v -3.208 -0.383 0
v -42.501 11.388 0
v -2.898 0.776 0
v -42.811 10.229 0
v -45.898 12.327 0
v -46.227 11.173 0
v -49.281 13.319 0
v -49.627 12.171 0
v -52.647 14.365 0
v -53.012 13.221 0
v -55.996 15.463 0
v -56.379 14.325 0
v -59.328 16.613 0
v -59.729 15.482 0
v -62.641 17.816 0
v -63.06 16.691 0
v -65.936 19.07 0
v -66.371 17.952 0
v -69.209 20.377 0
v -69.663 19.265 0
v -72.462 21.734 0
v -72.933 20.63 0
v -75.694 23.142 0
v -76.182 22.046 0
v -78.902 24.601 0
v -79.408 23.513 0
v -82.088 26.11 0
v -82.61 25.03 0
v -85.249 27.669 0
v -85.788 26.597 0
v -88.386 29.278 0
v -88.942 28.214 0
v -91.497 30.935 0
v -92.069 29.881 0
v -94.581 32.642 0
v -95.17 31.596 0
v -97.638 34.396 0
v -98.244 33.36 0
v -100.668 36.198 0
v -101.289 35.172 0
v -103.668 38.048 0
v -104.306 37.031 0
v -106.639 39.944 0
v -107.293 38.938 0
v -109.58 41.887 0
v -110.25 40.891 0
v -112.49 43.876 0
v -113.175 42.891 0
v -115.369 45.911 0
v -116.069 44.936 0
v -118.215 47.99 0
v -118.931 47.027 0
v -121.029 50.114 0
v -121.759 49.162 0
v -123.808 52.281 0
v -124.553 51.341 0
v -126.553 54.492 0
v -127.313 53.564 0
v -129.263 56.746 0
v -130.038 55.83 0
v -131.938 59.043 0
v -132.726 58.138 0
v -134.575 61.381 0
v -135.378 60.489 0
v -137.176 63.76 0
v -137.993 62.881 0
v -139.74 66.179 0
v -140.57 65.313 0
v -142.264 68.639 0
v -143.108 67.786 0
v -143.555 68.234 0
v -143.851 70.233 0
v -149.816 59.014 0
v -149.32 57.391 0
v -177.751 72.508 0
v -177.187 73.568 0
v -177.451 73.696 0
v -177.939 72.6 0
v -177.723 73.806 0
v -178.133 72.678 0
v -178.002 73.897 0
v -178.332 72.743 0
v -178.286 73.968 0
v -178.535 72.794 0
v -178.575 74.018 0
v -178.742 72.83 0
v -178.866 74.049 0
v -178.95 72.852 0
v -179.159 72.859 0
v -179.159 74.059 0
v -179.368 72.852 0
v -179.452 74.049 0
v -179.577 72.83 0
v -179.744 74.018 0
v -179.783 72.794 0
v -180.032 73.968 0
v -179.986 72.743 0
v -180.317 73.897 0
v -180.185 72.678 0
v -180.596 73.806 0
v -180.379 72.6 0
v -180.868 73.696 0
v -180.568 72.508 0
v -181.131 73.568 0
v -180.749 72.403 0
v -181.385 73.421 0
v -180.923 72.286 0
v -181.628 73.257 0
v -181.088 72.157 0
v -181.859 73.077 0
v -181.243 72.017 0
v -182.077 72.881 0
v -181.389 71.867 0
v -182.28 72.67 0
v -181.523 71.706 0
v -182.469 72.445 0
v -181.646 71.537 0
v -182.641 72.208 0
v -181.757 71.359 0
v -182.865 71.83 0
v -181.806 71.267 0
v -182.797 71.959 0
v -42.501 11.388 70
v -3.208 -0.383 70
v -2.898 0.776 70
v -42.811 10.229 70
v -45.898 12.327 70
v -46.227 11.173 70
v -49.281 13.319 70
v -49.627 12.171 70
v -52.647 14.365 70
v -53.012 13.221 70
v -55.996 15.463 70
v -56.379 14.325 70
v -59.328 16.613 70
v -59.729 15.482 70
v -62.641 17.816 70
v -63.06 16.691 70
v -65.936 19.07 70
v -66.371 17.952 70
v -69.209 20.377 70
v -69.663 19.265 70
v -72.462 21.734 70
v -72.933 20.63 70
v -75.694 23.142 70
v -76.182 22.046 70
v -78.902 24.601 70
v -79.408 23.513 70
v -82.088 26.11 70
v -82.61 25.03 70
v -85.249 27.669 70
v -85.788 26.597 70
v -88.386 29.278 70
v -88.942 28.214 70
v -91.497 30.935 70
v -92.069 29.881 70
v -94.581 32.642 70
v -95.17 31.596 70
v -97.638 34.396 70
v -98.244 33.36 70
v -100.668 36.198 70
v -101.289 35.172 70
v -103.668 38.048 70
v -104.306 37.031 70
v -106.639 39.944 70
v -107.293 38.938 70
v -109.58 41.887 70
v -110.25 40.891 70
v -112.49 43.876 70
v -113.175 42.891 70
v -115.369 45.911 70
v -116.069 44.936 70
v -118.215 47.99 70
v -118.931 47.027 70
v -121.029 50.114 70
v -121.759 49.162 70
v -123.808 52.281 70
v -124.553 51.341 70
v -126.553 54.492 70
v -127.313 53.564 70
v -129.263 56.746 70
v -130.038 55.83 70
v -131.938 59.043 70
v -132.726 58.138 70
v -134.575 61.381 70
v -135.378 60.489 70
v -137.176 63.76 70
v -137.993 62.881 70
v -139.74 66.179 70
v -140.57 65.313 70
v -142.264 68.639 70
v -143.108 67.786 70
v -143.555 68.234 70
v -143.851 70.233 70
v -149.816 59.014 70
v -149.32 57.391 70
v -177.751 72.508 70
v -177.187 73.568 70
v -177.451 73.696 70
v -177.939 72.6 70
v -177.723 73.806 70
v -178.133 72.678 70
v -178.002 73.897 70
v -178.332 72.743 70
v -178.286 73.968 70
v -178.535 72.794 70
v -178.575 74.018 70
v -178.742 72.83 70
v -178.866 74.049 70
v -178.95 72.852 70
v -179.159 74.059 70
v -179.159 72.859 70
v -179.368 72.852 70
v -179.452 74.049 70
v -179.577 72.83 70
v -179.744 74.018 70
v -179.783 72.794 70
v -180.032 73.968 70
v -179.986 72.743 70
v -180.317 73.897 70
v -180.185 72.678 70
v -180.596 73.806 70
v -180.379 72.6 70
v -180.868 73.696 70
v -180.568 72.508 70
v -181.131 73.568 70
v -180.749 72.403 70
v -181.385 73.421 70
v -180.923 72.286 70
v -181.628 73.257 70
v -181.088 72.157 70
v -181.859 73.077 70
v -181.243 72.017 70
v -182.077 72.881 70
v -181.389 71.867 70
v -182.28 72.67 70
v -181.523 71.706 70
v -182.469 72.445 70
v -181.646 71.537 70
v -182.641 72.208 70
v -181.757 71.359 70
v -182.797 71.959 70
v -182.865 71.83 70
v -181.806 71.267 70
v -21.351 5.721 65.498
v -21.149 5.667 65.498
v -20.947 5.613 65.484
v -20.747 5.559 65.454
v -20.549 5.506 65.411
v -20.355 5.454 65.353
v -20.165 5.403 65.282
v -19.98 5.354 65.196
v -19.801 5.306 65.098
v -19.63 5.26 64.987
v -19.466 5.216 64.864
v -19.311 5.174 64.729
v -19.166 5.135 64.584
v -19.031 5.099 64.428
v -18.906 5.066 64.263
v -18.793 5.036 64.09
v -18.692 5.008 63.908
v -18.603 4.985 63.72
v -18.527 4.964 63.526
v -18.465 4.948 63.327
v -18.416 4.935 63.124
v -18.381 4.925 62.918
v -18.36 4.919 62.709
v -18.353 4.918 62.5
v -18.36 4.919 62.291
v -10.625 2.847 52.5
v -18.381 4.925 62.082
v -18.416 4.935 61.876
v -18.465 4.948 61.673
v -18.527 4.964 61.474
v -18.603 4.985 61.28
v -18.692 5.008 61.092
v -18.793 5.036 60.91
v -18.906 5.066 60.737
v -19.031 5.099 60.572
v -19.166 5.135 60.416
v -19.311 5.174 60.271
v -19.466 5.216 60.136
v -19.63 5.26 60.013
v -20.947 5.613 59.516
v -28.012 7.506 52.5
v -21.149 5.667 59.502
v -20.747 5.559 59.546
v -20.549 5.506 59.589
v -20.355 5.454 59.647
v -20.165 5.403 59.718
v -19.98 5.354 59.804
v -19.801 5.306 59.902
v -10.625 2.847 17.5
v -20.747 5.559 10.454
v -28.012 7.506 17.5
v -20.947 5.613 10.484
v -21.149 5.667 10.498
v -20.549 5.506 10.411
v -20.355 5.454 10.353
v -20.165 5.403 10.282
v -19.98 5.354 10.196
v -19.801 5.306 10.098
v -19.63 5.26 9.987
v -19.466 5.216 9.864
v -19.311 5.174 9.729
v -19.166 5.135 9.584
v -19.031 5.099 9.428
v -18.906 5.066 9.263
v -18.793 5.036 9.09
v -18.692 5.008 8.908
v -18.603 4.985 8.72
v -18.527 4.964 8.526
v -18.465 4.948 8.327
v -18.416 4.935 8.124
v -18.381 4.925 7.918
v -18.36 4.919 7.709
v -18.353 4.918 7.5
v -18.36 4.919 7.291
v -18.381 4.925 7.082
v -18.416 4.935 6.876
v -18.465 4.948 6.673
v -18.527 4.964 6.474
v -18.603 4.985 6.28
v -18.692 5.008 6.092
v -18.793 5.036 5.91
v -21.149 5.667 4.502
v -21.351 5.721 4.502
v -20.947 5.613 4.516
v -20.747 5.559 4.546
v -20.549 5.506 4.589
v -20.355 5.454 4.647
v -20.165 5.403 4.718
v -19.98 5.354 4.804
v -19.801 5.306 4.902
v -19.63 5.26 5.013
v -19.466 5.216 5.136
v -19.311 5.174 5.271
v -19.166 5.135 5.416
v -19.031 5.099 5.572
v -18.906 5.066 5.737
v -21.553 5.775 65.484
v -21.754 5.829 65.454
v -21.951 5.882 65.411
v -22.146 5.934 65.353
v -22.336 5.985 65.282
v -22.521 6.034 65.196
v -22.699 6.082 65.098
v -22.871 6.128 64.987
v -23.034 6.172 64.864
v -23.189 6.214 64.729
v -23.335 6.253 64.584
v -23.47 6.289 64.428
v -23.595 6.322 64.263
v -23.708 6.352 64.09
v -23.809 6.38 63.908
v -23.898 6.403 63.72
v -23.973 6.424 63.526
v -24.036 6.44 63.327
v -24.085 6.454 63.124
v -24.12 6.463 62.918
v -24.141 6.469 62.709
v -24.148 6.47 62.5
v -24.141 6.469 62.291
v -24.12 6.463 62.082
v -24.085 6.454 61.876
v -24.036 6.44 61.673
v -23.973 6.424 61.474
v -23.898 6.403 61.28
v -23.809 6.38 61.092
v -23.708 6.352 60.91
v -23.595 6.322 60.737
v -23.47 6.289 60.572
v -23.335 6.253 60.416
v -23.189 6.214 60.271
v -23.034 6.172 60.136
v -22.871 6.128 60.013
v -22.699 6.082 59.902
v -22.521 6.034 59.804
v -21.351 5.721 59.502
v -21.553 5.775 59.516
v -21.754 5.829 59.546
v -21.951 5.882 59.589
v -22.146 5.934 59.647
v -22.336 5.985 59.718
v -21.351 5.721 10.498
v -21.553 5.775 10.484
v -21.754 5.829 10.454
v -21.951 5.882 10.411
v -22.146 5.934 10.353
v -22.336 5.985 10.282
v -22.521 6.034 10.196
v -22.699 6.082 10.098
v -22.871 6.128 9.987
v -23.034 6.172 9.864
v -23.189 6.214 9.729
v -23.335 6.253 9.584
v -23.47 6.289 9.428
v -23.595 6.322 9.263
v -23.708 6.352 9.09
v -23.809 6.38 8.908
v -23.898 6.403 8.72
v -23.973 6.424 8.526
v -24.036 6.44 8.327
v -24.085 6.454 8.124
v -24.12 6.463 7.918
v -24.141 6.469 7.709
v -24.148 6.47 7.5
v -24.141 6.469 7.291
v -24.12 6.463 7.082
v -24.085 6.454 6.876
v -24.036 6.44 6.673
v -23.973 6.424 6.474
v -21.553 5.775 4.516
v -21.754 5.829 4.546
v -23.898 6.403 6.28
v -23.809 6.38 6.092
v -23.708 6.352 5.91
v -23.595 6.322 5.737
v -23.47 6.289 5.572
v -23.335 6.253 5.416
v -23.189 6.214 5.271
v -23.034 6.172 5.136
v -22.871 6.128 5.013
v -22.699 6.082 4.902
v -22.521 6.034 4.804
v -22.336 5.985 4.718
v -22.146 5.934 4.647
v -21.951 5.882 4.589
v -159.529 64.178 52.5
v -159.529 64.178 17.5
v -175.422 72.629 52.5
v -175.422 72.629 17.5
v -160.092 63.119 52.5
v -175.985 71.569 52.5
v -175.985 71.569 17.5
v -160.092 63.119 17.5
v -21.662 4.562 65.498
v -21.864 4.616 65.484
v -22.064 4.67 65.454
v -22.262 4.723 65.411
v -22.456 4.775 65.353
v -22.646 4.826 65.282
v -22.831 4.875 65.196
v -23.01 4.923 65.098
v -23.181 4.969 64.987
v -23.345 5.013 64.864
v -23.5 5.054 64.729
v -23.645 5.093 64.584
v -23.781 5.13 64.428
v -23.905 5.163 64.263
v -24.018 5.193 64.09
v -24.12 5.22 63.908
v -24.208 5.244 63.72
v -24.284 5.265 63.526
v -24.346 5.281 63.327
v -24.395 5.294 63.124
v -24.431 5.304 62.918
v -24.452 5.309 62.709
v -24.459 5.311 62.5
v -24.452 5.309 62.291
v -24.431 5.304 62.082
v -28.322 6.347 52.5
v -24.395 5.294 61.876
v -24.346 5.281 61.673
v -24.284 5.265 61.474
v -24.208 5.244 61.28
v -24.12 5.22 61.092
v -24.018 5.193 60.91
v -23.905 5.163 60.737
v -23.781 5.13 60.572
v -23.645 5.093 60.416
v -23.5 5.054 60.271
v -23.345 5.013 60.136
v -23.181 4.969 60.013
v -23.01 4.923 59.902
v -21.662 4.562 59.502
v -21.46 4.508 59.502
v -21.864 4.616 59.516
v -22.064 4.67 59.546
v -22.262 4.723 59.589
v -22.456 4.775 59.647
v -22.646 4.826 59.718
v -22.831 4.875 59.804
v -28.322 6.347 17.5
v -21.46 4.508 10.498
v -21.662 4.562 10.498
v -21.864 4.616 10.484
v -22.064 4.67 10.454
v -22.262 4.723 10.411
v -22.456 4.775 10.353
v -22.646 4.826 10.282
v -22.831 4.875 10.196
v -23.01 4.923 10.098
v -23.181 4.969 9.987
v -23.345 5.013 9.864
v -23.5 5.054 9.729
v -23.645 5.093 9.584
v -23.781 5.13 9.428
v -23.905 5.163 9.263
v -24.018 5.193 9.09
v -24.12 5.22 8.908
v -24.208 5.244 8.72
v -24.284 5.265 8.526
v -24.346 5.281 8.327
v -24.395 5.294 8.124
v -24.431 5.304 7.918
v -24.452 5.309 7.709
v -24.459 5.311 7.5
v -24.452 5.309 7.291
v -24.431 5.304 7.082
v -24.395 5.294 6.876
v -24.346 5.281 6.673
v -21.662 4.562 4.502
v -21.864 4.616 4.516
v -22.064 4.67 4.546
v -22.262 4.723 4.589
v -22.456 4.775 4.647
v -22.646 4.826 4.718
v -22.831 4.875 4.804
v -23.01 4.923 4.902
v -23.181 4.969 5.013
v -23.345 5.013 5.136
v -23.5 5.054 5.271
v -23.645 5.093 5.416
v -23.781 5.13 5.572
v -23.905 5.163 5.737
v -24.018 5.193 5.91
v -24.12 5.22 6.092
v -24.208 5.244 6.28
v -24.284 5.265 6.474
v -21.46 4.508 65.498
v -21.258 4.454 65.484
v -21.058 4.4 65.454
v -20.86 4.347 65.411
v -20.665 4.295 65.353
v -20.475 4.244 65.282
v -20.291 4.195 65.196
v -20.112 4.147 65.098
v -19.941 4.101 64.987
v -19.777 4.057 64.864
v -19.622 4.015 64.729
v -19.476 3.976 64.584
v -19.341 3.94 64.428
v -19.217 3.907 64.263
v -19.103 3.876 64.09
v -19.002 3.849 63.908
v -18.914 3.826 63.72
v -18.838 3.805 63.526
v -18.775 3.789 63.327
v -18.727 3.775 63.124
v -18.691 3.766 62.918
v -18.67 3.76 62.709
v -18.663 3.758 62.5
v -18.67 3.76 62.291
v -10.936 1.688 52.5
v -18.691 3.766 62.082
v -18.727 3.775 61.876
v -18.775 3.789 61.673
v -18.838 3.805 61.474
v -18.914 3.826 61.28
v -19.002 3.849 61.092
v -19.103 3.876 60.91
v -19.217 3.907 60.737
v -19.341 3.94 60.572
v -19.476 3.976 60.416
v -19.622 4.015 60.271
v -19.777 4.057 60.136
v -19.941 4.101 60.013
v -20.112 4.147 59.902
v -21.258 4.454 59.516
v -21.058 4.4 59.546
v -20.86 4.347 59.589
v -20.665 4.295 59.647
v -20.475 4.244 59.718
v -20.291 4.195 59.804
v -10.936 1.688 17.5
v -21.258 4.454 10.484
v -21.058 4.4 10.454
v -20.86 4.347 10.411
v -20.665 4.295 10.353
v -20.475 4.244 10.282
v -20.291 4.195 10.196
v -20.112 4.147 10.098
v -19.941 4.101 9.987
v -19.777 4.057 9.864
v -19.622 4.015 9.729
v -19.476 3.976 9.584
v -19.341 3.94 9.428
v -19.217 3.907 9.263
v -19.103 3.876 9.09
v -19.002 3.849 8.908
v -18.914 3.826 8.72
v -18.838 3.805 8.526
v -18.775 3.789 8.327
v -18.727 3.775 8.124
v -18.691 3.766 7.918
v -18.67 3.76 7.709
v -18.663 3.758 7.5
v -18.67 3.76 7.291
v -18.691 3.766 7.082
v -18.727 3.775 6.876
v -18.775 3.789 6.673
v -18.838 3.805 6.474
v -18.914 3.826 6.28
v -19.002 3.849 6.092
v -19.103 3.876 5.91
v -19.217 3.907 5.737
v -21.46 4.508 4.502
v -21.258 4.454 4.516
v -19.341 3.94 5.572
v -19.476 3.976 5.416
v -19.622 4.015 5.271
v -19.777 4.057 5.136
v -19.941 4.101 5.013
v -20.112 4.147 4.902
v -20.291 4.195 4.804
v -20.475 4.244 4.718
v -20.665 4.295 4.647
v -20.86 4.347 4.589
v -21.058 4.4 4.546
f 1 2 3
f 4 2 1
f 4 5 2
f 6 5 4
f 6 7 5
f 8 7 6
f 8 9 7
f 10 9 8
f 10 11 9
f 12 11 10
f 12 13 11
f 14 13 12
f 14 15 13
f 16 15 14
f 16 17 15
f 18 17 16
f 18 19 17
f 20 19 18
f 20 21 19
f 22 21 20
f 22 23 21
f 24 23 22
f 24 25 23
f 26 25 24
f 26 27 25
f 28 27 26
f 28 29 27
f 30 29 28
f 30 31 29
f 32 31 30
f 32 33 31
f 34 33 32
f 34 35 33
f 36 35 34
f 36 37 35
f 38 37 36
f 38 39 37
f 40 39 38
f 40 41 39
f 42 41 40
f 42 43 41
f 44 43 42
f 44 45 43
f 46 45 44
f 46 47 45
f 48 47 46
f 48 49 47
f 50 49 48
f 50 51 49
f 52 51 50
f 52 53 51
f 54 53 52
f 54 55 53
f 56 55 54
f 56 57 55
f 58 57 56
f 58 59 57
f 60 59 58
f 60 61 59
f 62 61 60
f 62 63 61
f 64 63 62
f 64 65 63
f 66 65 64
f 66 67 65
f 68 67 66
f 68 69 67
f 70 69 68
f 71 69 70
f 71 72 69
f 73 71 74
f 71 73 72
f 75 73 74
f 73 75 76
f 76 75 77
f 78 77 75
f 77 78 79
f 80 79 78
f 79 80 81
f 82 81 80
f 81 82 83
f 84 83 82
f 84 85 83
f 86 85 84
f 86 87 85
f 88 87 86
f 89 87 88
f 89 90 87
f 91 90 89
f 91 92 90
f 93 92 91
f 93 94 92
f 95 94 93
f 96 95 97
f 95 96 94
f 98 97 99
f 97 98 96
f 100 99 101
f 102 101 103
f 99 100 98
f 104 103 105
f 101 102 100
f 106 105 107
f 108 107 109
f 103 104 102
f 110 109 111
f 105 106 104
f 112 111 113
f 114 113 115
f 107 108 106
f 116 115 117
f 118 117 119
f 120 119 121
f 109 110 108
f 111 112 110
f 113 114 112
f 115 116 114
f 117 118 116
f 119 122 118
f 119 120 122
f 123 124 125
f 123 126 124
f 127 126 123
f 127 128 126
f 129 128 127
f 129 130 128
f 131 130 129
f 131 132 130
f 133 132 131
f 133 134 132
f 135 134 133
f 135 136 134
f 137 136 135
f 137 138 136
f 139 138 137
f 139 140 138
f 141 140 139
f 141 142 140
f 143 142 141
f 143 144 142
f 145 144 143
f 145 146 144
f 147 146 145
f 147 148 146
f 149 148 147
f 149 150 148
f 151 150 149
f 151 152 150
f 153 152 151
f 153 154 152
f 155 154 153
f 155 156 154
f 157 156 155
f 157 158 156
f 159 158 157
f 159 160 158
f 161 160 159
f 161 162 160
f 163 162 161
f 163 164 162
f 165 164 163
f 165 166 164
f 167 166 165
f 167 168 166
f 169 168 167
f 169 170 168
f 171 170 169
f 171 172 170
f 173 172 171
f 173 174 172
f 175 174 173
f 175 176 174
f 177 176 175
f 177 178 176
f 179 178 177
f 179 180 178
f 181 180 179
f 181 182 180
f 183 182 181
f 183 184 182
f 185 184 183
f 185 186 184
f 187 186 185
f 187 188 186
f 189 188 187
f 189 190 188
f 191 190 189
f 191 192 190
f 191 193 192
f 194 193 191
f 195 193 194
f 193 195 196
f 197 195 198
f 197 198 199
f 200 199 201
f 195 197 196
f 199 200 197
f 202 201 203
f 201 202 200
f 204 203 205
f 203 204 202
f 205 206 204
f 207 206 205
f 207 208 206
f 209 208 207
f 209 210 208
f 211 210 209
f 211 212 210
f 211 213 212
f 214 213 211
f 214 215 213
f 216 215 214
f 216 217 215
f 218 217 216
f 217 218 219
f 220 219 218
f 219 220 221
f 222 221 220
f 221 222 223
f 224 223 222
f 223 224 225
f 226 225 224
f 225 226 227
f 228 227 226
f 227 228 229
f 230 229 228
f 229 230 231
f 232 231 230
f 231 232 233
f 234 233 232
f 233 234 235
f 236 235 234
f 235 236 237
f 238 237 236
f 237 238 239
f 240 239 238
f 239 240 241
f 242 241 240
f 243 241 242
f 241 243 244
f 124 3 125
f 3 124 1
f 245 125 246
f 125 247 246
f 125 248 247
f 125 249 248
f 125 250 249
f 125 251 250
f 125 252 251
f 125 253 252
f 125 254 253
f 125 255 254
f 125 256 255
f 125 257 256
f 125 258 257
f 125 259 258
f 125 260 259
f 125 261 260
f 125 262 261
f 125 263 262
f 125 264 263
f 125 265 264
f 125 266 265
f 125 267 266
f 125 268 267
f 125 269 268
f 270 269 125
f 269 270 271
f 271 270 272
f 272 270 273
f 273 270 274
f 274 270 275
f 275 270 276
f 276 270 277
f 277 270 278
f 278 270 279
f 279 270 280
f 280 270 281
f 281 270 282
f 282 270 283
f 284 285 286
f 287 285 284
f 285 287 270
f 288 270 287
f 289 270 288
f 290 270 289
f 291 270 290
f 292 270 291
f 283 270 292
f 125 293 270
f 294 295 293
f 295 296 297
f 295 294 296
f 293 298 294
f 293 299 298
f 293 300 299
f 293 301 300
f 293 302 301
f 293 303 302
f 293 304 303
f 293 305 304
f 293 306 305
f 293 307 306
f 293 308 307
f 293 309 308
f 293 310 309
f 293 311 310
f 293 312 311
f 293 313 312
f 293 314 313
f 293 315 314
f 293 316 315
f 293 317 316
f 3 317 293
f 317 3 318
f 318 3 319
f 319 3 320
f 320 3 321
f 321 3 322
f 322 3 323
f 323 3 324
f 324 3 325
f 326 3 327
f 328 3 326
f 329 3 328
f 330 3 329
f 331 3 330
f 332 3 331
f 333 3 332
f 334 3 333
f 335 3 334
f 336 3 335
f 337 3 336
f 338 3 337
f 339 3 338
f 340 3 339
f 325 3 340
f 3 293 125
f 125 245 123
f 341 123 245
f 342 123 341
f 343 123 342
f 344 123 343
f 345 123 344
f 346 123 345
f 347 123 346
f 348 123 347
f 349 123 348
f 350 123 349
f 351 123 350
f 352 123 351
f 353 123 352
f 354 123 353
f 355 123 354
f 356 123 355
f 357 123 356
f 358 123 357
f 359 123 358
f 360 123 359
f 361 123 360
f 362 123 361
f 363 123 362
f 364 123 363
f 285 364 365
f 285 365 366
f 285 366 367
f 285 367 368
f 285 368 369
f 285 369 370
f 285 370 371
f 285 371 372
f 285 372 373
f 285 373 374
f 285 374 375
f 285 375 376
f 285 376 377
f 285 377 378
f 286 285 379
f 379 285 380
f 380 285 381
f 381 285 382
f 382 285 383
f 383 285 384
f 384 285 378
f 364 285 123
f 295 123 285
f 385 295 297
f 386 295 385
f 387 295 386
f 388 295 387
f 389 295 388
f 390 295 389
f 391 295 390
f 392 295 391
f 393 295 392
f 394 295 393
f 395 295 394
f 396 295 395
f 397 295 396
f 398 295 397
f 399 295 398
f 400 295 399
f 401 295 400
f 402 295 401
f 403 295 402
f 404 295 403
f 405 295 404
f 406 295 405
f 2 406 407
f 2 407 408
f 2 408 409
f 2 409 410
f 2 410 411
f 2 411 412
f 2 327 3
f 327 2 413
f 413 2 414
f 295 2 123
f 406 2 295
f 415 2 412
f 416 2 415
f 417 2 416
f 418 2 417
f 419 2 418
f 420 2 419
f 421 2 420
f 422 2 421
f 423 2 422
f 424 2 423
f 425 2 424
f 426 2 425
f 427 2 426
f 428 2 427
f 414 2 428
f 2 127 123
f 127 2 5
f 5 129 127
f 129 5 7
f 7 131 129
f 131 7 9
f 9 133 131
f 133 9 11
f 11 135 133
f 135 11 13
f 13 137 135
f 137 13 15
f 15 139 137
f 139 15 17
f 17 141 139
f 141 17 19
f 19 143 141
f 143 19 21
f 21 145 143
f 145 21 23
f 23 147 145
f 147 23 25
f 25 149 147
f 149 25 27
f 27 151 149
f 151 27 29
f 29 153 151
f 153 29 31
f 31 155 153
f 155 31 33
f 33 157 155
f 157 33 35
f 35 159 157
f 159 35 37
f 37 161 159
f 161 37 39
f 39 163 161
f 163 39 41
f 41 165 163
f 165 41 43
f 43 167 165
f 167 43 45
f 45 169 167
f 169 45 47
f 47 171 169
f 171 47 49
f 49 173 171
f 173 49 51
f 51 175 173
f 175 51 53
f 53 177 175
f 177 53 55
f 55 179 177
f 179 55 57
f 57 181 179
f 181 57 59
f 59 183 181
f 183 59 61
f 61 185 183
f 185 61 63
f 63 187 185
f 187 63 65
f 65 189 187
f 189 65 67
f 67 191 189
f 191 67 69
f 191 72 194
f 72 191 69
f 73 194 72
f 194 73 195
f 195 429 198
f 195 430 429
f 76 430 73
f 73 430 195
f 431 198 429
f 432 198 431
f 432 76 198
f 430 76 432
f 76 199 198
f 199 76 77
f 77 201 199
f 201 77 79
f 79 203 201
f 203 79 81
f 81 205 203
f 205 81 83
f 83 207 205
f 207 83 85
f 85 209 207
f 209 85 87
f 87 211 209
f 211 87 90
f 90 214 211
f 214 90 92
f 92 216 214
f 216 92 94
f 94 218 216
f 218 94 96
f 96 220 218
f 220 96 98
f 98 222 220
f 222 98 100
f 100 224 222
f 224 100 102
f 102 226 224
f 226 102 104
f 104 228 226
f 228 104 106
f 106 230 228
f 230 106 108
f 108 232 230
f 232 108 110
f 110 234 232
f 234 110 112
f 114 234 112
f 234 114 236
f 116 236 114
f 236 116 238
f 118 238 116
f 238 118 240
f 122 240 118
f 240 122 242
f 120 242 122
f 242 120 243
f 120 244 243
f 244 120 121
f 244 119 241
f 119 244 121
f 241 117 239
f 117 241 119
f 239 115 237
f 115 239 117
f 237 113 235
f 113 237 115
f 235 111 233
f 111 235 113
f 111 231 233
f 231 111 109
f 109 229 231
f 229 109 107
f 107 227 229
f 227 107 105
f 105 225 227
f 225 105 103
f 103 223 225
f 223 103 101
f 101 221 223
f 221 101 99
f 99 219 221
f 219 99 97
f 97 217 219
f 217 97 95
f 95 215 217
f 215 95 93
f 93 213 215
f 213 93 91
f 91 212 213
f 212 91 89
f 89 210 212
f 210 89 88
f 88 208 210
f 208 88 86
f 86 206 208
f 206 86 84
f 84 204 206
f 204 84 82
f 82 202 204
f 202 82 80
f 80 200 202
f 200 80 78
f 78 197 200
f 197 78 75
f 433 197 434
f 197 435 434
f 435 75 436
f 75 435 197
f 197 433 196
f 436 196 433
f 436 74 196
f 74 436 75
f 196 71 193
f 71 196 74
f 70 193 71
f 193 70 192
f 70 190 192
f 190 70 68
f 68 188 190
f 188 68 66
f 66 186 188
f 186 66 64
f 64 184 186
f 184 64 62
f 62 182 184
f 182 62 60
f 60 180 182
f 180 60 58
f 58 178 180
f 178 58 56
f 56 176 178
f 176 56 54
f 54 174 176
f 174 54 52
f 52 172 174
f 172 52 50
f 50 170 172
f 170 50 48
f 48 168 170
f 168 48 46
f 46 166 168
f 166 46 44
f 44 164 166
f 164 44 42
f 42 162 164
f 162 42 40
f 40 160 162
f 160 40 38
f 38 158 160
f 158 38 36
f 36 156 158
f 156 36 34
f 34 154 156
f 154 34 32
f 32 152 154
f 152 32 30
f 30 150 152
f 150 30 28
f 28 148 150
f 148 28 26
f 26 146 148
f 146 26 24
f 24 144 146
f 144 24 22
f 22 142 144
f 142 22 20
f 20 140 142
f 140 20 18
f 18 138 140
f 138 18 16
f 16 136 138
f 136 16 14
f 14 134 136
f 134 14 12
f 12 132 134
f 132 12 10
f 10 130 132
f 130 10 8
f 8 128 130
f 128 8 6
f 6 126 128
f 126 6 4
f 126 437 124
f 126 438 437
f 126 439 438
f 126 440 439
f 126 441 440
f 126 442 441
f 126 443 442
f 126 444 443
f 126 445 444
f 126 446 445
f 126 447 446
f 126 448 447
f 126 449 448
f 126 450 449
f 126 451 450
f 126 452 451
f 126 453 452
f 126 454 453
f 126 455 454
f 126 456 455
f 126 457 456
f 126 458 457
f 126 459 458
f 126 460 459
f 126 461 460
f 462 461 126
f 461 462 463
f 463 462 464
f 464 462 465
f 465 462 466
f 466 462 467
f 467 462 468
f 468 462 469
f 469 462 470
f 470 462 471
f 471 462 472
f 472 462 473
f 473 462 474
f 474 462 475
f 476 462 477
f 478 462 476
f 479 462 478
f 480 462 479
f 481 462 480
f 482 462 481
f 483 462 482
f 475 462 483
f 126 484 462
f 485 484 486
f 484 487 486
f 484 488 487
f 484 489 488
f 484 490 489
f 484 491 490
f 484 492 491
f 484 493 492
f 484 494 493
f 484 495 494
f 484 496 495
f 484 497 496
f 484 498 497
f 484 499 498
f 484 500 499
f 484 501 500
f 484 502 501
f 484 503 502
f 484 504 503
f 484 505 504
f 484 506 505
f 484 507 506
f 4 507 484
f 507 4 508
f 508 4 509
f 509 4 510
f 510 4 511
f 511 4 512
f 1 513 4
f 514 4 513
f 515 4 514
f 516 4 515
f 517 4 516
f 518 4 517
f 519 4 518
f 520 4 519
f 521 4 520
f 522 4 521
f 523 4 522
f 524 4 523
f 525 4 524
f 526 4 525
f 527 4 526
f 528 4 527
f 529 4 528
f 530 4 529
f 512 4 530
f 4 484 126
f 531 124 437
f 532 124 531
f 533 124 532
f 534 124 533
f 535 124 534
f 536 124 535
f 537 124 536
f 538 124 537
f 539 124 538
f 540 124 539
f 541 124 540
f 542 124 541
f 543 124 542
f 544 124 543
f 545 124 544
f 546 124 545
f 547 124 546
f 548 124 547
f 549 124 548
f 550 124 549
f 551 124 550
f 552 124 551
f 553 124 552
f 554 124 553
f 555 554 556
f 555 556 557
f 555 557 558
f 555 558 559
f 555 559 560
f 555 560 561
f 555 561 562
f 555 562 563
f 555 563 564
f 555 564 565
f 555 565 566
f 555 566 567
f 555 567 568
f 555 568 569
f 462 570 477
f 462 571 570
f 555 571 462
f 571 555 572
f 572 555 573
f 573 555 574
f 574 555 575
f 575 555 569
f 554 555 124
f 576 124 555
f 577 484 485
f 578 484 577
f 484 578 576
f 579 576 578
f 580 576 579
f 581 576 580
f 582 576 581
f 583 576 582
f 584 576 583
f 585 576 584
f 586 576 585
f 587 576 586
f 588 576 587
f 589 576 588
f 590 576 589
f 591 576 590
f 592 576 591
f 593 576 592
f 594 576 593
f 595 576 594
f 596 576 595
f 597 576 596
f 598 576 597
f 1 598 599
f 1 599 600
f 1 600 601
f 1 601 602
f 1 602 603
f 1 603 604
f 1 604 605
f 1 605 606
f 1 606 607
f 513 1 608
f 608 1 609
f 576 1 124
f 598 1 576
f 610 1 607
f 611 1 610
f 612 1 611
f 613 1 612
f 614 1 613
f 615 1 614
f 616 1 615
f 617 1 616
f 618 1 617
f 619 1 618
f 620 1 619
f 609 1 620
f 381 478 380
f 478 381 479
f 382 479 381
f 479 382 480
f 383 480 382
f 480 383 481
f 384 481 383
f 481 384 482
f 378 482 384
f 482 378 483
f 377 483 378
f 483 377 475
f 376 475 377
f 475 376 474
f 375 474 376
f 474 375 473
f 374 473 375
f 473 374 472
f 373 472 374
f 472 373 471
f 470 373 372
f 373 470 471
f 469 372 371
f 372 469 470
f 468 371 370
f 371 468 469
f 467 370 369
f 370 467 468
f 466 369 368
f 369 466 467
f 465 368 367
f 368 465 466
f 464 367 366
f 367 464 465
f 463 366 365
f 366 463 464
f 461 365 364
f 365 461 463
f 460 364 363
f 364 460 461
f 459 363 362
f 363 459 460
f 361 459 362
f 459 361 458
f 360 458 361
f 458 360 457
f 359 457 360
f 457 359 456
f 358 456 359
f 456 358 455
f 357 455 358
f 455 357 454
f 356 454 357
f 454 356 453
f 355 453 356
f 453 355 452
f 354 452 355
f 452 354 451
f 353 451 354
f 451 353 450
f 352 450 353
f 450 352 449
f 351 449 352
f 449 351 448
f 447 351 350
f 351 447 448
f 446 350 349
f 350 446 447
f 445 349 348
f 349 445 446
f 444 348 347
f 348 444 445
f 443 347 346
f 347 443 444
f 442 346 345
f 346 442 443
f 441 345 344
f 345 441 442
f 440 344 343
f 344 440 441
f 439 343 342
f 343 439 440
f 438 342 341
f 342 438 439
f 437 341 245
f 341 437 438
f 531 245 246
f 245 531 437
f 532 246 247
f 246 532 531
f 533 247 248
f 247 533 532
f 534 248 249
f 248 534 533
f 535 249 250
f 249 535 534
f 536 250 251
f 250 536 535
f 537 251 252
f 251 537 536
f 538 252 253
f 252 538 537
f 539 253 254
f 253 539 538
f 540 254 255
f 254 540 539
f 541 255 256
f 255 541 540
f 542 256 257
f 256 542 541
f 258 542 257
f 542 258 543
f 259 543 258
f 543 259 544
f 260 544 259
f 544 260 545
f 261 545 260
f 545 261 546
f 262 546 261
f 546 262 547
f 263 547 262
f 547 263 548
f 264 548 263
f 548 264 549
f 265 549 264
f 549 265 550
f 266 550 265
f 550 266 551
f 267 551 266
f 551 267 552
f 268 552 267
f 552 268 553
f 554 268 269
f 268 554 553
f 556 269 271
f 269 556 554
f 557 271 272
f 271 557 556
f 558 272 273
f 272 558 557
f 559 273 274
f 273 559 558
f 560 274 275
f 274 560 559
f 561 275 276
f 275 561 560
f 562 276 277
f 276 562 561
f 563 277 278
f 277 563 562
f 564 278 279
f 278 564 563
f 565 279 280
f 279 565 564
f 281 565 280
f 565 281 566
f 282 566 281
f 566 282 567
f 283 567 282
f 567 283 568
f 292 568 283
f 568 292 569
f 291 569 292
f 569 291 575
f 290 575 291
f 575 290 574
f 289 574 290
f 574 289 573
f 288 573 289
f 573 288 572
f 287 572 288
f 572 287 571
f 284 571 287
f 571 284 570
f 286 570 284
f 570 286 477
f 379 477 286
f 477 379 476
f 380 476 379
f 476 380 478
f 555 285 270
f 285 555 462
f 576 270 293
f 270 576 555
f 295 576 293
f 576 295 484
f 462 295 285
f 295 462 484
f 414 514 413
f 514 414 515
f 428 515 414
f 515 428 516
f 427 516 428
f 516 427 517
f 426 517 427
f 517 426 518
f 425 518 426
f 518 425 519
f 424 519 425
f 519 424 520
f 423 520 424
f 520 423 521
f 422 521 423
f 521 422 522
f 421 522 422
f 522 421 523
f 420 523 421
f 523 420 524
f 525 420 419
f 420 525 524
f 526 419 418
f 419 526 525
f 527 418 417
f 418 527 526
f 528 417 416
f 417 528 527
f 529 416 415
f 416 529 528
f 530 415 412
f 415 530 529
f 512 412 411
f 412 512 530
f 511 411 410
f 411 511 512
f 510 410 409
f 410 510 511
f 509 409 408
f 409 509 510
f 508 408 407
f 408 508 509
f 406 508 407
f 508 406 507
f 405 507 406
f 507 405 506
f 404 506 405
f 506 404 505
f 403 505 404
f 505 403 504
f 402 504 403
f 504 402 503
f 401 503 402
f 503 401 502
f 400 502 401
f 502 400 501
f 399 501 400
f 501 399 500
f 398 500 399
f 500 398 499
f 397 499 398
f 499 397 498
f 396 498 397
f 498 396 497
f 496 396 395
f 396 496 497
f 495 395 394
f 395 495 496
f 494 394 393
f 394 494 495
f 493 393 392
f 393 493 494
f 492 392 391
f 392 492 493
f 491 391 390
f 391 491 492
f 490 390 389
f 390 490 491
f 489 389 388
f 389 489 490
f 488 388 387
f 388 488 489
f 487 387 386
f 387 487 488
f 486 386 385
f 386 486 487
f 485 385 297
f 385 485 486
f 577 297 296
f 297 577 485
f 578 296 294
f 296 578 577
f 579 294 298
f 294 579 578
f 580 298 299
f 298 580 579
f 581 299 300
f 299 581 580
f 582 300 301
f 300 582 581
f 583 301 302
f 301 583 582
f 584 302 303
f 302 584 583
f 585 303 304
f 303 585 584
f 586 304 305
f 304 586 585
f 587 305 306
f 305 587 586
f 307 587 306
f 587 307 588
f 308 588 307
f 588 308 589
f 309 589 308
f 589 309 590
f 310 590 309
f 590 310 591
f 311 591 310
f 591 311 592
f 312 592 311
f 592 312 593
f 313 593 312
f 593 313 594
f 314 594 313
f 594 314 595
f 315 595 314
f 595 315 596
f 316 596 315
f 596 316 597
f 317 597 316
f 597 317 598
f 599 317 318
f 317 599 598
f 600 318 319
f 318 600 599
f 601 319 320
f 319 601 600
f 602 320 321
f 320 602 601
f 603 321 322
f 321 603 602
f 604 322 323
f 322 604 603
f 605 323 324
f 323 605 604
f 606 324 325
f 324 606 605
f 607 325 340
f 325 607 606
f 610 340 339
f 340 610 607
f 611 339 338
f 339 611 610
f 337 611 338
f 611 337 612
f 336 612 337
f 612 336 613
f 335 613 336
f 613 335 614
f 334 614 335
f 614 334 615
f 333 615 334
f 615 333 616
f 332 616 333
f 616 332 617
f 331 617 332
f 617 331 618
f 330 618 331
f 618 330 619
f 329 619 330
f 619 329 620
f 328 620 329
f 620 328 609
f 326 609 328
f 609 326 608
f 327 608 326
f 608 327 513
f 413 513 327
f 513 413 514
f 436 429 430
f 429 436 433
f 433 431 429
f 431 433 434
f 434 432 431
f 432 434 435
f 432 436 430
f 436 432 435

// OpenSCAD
// file: ../src/door_catch.scad
in=25.4;

// how thick is the door?
door_thick=44;


// how wide the door is; makes for cleaner angles
door_width=28*in;

// how far should the door be open?
// distance of gap will be echo'd
//open_angle=(sin($t*360)/2+0.5)*45;
open_angle=13;

// distance to edge, used to place hole
catch=15;

// size of catch hole
catch_x=18;
catch_y=35;

// size of screw holes
screw=6;

// space between screws
// screws are assumed to be centered in door_thick
screw_gap=55;

// space around screw holes if automatically calculating height
screw_wall=4;

// thickness of part
wall=1.2;

//height=screw_gap+screw+screw_wall*2;
height=70;

// size of Z shape that stops the door from closing
latch=in/2;

// extra curve at end of the part to make closing smoother
close_r=3;

// trim off ends to fit printer bed 
//trim_base=14;
trim_base=3;
trim_end=10;

// only used for drawing a preview door
door_h=height;
display_angle=open_angle;


$fn=90;

big_fn=400;

function segment_radius(height, chord) = (height/2)+(chord*chord)/(8*height);

// link to sketch
open_y=sin(open_angle)*door_width;
open_x=door_width-(cos(open_angle)*door_width);
opening=sqrt((pow(open_x,2)+pow((open_y-door_thick),2)));
echo(opening/in);
echo(opening);

// link to sketch
latch_x=door_width-(cos(open_angle)*(door_width-latch));
latch_y=(sin(open_angle)*(door_width-latch))-door_thick;
latch_hyp=sqrt(pow(latch_x,2)+pow(latch_y,2));
latch_angle=atan(latch_y/latch_x);
radius=segment_radius(latch_x,latch_y*2);

module door() {
    translate([door_width,0])
    mirror([1,0,0])
    rotate([0,0,display_angle])
    color("tan")
    cube([door_width,door_thick,door_h]);
}

module profile() {
    translate([-wall,trim_base])
    square([wall,door_thick-trim_base]);
    translate([radius,door_thick])
    difference() {
        circle(r=radius+wall,$fn=big_fn);
        circle(r=radius,$fn=big_fn);

        // cut off botttom 
        translate([-radius-wall,-radius-wall*2])
        square([radius*2+wall*2,radius+wall*2]);

        // top right
        square([radius+wall*2,radius+wall*2]);

        // door
        translate([door_width-radius,-door_thick])
        mirror([1,0,0])
        rotate([0,0,display_angle])
        square([door_width,radius]);
    }
    translate([door_width,0])
    rotate([0,0,-open_angle]) 
    translate([-door_width,0]) {
        translate([-wall,-wall])
        square([latch,wall]);
        translate([-wall,-wall])
        square([wall,door_thick+wall-close_r-trim_end]);
        translate([-wall-close_r,door_thick-close_r-trim_end])
        difference() {
            intersection() {
                circle(r=close_r+wall);
                square([close_r+wall,close_r+wall]);
            }
            circle(r=close_r);
        }
    }
}

module dirror_y() {
    children();
    mirror([0,1])
    children();
}

module catch() {
    translate([door_thick/2-catch_x/2-catch,0])
    square([catch_x,catch_y],center=true);
    children();
}

module screws() {
    dirror_y()
    translate([0,screw_gap/2])
    circle(d=screw);
}

module place_catch(angle=0) {
    translate([door_width,0])
    rotate([0,0,-angle])
    translate([-door_width-wall*2,door_thick/2,height/2])
    rotate([90,0,90])
    linear_extrude(height=wall*3)
    children();
}

module latch() {
    difference() {
        linear_extrude(height=height)
        profile();
        place_catch()
        // uncomment this to allow the door to close
        catch()
        screws();
        place_catch(open_angle)
        catch();
    }
}
// main file
include <../src/door_catch.scad>;

catch=(sin($t*360)/2+0.5)*30;

// RENDER gif
module demo() {
    rotate([0,0,75])
    latch();
}

demo();
